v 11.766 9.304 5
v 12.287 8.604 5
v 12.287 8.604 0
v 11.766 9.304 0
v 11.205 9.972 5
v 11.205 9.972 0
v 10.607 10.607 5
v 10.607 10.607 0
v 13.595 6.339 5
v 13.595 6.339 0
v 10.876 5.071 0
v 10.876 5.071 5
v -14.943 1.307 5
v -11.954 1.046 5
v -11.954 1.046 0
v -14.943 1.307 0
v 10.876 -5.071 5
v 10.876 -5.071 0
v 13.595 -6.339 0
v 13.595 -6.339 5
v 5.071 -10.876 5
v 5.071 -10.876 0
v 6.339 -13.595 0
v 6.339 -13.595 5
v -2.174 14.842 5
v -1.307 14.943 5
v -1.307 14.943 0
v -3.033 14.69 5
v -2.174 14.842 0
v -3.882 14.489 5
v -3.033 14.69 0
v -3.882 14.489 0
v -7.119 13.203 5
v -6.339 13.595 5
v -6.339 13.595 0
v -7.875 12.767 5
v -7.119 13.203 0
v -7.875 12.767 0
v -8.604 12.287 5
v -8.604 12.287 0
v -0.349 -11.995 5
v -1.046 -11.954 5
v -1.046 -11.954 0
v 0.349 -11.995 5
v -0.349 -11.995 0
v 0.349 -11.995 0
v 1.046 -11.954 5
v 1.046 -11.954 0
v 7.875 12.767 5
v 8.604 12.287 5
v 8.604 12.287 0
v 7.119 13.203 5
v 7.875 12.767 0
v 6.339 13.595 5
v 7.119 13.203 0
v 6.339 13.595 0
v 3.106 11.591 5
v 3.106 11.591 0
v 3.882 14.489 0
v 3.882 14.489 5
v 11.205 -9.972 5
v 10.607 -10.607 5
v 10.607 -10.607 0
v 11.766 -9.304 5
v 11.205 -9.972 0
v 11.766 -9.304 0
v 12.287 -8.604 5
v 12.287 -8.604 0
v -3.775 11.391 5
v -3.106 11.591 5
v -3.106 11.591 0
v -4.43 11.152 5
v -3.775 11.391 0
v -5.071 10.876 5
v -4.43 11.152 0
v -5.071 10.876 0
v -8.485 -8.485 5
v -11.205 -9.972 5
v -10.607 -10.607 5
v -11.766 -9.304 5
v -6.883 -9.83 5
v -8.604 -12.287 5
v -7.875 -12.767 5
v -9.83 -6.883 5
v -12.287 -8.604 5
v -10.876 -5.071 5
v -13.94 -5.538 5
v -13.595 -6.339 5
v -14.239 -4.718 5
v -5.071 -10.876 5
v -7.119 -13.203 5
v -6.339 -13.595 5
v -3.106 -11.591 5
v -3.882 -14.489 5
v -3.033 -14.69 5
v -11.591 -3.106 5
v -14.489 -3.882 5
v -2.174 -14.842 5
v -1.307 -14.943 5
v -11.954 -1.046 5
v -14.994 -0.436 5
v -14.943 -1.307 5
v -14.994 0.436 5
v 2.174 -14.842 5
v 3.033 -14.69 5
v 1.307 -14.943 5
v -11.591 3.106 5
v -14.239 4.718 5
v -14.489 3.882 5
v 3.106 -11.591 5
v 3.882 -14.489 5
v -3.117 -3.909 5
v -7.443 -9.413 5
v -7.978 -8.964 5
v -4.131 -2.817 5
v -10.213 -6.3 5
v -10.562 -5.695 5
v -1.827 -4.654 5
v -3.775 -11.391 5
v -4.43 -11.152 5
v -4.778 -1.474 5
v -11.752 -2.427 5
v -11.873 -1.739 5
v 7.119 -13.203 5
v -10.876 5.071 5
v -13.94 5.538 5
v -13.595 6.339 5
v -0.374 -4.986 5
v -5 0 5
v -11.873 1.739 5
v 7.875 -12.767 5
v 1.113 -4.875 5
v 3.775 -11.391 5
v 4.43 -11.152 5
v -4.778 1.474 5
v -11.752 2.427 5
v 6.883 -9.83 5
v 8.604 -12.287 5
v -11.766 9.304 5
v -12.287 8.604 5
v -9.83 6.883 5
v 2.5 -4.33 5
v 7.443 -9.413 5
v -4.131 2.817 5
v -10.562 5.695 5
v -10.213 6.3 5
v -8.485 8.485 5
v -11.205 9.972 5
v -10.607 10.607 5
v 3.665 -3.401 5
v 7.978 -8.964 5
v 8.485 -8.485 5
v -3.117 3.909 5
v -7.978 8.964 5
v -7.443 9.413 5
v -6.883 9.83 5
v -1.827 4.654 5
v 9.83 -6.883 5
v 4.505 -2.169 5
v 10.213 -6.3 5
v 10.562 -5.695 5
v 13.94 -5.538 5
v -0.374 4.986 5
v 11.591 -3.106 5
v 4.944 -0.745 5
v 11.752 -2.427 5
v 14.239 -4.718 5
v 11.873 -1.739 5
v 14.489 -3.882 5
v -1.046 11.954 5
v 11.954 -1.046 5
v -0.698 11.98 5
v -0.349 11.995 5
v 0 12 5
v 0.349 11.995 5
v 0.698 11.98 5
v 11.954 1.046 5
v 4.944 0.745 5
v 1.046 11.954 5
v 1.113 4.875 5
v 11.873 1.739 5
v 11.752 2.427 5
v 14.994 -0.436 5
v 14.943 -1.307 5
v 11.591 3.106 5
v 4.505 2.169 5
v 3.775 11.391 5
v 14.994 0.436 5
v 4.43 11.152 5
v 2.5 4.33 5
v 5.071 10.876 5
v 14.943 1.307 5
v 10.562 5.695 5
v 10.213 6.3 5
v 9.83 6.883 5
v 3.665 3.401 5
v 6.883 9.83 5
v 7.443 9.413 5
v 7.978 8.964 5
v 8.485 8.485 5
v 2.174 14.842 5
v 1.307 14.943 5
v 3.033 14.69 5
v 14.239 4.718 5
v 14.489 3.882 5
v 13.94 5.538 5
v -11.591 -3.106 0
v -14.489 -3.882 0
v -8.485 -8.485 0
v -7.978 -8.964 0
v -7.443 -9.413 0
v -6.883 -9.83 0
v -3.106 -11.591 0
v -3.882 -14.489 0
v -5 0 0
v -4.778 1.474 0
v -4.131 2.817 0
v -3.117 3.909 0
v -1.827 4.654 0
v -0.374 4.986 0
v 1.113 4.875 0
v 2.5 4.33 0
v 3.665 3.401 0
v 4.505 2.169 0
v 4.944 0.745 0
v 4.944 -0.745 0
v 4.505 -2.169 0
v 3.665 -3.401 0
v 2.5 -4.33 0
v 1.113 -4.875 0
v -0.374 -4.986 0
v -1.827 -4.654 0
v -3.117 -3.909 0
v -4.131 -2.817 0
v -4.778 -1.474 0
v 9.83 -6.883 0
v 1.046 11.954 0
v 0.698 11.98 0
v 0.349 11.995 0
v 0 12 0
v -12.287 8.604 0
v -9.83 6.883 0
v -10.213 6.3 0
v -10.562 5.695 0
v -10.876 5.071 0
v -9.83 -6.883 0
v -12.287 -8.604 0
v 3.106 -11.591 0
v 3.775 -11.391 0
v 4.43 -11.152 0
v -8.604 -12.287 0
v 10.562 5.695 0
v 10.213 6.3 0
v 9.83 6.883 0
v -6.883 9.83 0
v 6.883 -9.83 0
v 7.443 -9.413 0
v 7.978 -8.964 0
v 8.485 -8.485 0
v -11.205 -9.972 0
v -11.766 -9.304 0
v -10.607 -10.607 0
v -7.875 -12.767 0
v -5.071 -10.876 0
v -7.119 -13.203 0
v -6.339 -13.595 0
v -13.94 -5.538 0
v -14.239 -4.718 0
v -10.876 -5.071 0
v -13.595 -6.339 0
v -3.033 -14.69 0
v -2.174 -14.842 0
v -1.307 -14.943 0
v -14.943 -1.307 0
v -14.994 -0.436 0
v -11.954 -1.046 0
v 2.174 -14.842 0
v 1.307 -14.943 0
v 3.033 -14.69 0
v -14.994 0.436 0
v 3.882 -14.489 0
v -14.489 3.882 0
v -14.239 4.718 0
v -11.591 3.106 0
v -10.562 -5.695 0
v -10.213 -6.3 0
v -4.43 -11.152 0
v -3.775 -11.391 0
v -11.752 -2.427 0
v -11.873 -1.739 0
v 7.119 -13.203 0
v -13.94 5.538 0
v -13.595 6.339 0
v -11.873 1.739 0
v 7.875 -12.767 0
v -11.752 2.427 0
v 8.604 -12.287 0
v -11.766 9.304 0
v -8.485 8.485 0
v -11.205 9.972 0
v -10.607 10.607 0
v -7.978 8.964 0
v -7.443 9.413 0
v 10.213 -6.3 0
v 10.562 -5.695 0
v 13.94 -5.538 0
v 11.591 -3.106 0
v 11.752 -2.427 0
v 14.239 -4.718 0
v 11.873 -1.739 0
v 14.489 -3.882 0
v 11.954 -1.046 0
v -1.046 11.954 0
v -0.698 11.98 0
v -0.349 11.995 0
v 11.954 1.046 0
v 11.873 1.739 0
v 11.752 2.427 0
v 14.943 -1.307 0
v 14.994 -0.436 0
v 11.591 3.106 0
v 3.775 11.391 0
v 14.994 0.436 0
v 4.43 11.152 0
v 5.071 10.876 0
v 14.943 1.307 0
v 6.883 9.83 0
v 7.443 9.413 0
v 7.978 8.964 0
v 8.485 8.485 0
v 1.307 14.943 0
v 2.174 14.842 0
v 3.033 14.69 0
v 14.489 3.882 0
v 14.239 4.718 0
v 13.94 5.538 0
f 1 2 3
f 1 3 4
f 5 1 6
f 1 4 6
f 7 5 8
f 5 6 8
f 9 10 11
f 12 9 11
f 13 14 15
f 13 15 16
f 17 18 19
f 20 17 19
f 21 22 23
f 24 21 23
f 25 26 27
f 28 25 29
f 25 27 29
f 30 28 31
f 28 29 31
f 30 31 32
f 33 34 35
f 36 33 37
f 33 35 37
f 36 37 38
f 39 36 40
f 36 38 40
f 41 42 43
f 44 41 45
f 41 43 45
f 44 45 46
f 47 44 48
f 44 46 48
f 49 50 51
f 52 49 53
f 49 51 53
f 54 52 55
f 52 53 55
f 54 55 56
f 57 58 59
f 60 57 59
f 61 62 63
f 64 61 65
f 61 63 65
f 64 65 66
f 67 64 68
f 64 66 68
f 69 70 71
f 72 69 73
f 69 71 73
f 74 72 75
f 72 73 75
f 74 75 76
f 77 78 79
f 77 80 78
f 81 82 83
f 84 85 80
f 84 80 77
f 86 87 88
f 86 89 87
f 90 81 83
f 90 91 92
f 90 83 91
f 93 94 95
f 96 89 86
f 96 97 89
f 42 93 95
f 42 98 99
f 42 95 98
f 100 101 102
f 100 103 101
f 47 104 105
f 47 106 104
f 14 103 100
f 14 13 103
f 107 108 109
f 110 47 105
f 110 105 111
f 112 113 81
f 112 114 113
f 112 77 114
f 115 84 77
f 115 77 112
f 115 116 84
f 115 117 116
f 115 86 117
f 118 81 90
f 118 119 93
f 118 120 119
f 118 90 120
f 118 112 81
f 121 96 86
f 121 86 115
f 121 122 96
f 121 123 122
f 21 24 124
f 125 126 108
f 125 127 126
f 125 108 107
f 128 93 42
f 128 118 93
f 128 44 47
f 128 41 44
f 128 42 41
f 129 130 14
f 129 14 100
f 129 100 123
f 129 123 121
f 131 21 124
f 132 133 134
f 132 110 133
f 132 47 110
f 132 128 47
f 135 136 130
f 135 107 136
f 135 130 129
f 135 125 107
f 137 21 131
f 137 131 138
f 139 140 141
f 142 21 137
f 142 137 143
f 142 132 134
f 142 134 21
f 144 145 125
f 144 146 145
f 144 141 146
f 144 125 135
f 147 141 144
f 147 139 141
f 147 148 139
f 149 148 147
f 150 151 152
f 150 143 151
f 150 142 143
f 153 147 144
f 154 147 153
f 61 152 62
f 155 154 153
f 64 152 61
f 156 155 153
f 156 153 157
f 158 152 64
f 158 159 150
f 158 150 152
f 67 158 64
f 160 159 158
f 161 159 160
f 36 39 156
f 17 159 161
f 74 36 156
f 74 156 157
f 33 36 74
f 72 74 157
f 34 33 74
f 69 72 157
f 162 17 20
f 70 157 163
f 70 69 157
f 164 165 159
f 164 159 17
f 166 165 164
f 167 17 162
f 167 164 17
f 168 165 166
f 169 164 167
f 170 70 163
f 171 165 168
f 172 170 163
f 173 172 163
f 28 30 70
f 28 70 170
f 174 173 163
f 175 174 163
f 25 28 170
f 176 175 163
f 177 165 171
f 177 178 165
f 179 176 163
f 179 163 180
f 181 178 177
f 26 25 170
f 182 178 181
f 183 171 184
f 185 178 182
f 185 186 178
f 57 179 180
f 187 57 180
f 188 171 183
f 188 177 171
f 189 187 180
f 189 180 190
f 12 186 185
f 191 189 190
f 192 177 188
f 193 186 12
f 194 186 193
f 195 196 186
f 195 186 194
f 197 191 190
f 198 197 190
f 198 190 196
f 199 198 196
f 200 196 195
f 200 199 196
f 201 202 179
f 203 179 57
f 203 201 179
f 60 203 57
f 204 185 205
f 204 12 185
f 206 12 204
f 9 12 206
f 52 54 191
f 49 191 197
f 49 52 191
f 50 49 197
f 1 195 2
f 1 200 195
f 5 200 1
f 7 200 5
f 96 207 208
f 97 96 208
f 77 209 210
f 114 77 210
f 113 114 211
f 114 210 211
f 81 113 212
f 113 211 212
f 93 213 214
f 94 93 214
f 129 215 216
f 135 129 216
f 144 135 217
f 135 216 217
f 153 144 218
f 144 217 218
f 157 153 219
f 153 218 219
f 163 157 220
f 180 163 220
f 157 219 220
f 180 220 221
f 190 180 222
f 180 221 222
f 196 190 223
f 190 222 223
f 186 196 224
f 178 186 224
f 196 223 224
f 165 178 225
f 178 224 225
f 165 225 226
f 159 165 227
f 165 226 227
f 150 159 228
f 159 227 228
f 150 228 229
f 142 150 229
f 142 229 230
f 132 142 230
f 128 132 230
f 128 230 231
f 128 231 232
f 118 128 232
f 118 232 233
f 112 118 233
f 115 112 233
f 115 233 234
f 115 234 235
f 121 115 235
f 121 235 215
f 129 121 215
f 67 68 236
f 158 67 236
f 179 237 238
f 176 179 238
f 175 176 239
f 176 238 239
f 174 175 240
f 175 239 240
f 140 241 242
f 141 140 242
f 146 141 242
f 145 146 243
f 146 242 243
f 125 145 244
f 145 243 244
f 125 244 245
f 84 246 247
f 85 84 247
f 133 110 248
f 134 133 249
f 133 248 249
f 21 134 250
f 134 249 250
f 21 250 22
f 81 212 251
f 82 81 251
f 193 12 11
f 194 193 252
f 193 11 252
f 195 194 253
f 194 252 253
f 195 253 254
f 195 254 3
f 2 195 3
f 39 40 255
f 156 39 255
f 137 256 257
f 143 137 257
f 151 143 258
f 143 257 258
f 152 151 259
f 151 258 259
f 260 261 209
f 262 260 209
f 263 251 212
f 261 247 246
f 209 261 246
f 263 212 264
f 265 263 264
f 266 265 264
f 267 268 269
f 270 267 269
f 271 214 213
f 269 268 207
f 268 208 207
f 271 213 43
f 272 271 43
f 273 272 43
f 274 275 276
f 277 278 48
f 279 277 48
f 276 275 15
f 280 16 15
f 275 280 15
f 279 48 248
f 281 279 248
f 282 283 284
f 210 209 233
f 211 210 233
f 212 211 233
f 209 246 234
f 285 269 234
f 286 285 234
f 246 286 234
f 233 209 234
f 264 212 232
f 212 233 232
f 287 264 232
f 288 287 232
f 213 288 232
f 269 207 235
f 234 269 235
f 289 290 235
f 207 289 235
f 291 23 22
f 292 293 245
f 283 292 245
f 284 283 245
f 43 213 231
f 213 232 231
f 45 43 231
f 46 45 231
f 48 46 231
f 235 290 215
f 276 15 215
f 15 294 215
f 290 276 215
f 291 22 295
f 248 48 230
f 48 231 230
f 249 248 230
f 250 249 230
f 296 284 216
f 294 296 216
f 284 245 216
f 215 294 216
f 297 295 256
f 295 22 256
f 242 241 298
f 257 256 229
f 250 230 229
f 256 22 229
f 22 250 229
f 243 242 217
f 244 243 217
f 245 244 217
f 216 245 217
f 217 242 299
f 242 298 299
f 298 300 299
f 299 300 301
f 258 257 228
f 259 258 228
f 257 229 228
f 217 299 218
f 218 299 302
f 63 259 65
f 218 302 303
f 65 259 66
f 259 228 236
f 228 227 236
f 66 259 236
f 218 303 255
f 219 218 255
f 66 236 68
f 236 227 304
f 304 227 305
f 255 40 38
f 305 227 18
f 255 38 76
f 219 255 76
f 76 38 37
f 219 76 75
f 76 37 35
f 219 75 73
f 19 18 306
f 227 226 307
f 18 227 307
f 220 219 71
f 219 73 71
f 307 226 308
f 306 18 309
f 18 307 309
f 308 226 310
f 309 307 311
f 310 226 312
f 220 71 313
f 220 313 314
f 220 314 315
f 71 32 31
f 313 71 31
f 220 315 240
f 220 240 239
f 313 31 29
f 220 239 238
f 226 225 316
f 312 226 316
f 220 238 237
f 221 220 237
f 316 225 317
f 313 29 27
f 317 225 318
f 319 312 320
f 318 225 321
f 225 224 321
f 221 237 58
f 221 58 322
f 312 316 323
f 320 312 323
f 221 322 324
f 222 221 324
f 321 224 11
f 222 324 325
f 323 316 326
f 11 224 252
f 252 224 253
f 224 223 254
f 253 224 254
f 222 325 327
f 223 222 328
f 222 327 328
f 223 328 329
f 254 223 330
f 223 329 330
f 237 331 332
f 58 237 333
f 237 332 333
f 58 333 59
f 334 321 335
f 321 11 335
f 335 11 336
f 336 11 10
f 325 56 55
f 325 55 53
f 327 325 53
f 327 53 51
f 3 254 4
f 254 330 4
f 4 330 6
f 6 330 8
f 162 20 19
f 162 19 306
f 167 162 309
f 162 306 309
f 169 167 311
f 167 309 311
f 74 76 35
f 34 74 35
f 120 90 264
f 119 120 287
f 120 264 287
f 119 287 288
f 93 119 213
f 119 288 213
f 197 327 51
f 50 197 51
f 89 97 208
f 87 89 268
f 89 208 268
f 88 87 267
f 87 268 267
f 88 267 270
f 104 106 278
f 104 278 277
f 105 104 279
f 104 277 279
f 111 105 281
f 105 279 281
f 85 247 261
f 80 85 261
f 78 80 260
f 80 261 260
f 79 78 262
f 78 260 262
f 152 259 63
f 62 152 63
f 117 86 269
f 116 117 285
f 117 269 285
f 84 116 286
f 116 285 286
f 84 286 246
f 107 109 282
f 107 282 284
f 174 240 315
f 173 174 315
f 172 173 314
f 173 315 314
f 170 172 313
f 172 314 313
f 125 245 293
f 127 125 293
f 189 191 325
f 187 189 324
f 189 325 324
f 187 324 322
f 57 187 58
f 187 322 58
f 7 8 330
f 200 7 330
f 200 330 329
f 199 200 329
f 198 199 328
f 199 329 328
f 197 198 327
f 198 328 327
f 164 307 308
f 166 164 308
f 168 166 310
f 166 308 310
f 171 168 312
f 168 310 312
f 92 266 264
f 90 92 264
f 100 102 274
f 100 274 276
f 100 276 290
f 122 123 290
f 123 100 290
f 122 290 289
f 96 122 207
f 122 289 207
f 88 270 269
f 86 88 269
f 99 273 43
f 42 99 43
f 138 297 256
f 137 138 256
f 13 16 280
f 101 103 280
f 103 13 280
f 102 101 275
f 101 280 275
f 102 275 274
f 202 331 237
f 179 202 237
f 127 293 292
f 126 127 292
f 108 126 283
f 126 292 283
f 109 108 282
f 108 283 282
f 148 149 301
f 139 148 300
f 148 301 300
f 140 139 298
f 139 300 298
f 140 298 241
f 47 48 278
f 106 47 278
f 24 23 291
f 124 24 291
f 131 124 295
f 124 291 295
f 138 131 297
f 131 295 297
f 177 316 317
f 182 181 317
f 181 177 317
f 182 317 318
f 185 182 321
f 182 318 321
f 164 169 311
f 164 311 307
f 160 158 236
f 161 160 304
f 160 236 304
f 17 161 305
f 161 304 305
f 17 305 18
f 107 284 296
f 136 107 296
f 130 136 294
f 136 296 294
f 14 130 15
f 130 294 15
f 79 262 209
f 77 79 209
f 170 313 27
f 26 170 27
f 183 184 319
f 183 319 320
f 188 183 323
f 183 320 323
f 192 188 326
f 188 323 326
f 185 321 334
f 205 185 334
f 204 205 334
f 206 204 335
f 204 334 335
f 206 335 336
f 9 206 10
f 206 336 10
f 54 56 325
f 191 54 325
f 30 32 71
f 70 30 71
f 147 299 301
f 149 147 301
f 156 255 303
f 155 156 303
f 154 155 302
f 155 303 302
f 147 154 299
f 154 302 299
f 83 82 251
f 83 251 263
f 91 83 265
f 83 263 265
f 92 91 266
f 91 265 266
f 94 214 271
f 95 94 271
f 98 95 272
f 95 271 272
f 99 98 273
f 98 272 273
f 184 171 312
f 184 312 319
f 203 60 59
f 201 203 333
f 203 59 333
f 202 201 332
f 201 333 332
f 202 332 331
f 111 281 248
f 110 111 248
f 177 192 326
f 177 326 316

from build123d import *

# Parameters (mm, degrees)
SKETCH_1_R          = 15
EXTRUDE_1_DEPTH     = 5
CUT_EXTRUDE_1_REACH = 23.794
CUT_EXTRUDE_2_REACH = 23.755
SKETCH_3_R          = 5


with BuildPart() as part:
    # ｽｹｯﾁ1 → ﾎﾞｽ - 押し出し1 (new body)
    with BuildSketch(Plane.XY):
        Circle(SKETCH_1_R)
    extrude(amount=EXTRUDE_1_DEPTH)

    # ｽｹｯﾁ2 → ｶｯﾄ - 押し出し1 (cut, up to next)
    with BuildSketch(Plane(origin=(0, 0, 0), x_dir=(-1, 0, 0), z_dir=(0, 0, -1)), mode=Mode.PRIVATE) as cut_extrude_1_sk1:
        with BuildLine():
            Line((-6.882917236, 9.829824531), (-8.603646545, 12.287280664))
            ThreePointArc((-8.603646545, 12.287280664), (-9.641814145, 11.490666647), (-10.606601718, 10.606601718))
            Line((-10.606601718, 10.606601718), (-8.485281374, 8.485281374))
            ThreePointArc((-8.485281374, 8.485281374), (-7.713451316, 9.192533317), (-6.882917236, 9.829824531))
        make_face()
    cut_extrude_1_tool1 = extrude(cut_extrude_1_sk1.sketch, amount=-CUT_EXTRUDE_1_REACH, mode=Mode.PRIVATE) & part.part
    # ｽｹｯﾁ2 → ｶｯﾄ - 押し出し1 (cut, up to next)
    with BuildSketch(Plane(origin=(0, 0, 0), x_dir=(-1, 0, 0), z_dir=(0, 0, -1)), mode=Mode.PRIVATE) as cut_extrude_1_sk2:
        with BuildLine():
            Line((-3.105828541, 11.591109915), (-3.882285677, 14.488887394))
            ThreePointArc((-3.882285677, 14.488887394), (-5.13030215, 14.095389312), (-6.339273926, 13.594616806))
            Line((-6.339273926, 13.594616806), (-5.071419141, 10.875693444))
            ThreePointArc((-5.071419141, 10.875693444), (-4.10424172, 11.276311449), (-3.105828541, 11.591109915))
        make_face()
    cut_extrude_1_tool2 = extrude(cut_extrude_1_sk2.sketch, amount=-CUT_EXTRUDE_1_REACH, mode=Mode.PRIVATE) & part.part
    # ｽｹｯﾁ2 → ｶｯﾄ - 押し出し1 (cut, up to next)
    with BuildSketch(Plane(origin=(0, 0, 0), x_dir=(-1, 0, 0), z_dir=(0, 0, -1)), mode=Mode.PRIVATE) as cut_extrude_1_sk3:
        with BuildLine():
            ThreePointArc((0, 12), (0.523432648, 11.988578659), (1.045868913, 11.954336377))
            Line((1.045868913, 11.954336377), (1.307336141, 14.942920471))
            ThreePointArc((1.307336141, 14.942920471), (0.65429081, 14.985723324), (0, 15))
            Line((0, 15), (0, 12))
        make_face()
    cut_extrude_1_tool3 = extrude(cut_extrude_1_sk3.sketch, amount=-CUT_EXTRUDE_1_REACH, mode=Mode.PRIVATE) & part.part
    # ｽｹｯﾁ2 → ｶｯﾄ - 押し出し1 (cut, up to next)
    with BuildSketch(Plane(origin=(0, 0, 0), x_dir=(-1, 0, 0), z_dir=(0, 0, -1)), mode=Mode.PRIVATE) as cut_extrude_1_sk4:
        with BuildLine():
            ThreePointArc((-1.045868913, 11.954336377), (-0.523432648, 11.988578659), (0, 12))
            Line((0, 12), (0, 15))
            ThreePointArc((0, 15), (-0.65429081, 14.985723324), (-1.307336141, 14.942920471))
            Line((-1.307336141, 14.942920471), (-1.045868913, 11.954336377))
        make_face()
    cut_extrude_1_tool4 = extrude(cut_extrude_1_sk4.sketch, amount=-CUT_EXTRUDE_1_REACH, mode=Mode.PRIVATE) & part.part
    # ｽｹｯﾁ2 → ｶｯﾄ - 押し出し1 (cut, up to next)
    with BuildSketch(Plane(origin=(0, 0, 0), x_dir=(-1, 0, 0), z_dir=(0, 0, -1)), mode=Mode.PRIVATE) as cut_extrude_1_sk5:
        with BuildLine():
            ThreePointArc((6.339273926, 13.594616806), (5.13030215, 14.095389312), (3.882285677, 14.488887394))
            Line((3.882285677, 14.488887394), (3.105828541, 11.591109915))
            ThreePointArc((3.105828541, 11.591109915), (4.10424172, 11.276311449), (5.071419141, 10.875693444))
            Line((5.071419141, 10.875693444), (6.339273926, 13.594616806))
        make_face()
    cut_extrude_1_tool5 = extrude(cut_extrude_1_sk5.sketch, amount=-CUT_EXTRUDE_1_REACH, mode=Mode.PRIVATE) & part.part
    # ｽｹｯﾁ2 → ｶｯﾄ - 押し出し1 (cut, up to next)
    with BuildSketch(Plane(origin=(0, 0, 0), x_dir=(-1, 0, 0), z_dir=(0, 0, -1)), mode=Mode.PRIVATE) as cut_extrude_1_sk6:
        with BuildLine():
            ThreePointArc((10.606601718, 10.606601718), (9.641814145, 11.490666647), (8.603646545, 12.287280664))
            Line((8.603646545, 12.287280664), (6.882917236, 9.829824531))
            ThreePointArc((6.882917236, 9.829824531), (7.713451316, 9.192533317), (8.485281374, 8.485281374))
            Line((8.485281374, 8.485281374), (10.606601718, 10.606601718))
        make_face()
    cut_extrude_1_tool6 = extrude(cut_extrude_1_sk6.sketch, amount=-CUT_EXTRUDE_1_REACH, mode=Mode.PRIVATE) & part.part
    # ｽｹｯﾁ2 → ｶｯﾄ - 押し出し1 (cut, up to next)
    with BuildSketch(Plane(origin=(0, 0, 0), x_dir=(-1, 0, 0), z_dir=(0, 0, -1)), mode=Mode.PRIVATE) as cut_extrude_1_sk7:
        with BuildLine():
            ThreePointArc((13.594616806, 6.339273926), (12.990381057, 7.5), (12.287280664, 8.603646545))
            Line((12.287280664, 8.603646545), (9.829824531, 6.882917236))
            ThreePointArc((9.829824531, 6.882917236), (10.392304845, 6), (10.875693444, 5.071419141))
            Line((10.875693444, 5.071419141), (13.594616806, 6.339273926))
        make_face()
    cut_extrude_1_tool7 = extrude(cut_extrude_1_sk7.sketch, amount=-CUT_EXTRUDE_1_REACH, mode=Mode.PRIVATE) & part.part
    # ｽｹｯﾁ2 → ｶｯﾄ - 押し出し1 (cut, up to next)
    with BuildSketch(Plane(origin=(0, 0, 0), x_dir=(-1, 0, 0), z_dir=(0, 0, -1)), mode=Mode.PRIVATE) as cut_extrude_1_sk8:
        with BuildLine():
            ThreePointArc((14.942920471, 1.307336141), (14.772116295, 2.604722665), (14.488887394, 3.882285677))
            Line((14.488887394, 3.882285677), (11.591109915, 3.105828541))
            ThreePointArc((11.591109915, 3.105828541), (11.817693036, 2.083778132), (11.954336377, 1.045868913))
            Line((11.954336377, 1.045868913), (14.942920471, 1.307336141))
        make_face()
    cut_extrude_1_tool8 = extrude(cut_extrude_1_sk8.sketch, amount=-CUT_EXTRUDE_1_REACH, mode=Mode.PRIVATE) & part.part
    # ｽｹｯﾁ2 → ｶｯﾄ - 押し出し1 (cut, up to next)
    with BuildSketch(Plane(origin=(0, 0, 0), x_dir=(-1, 0, 0), z_dir=(0, 0, -1)), mode=Mode.PRIVATE) as cut_extrude_1_sk9:
        with BuildLine():
            ThreePointArc((14.488887394, -3.882285677), (14.772116295, -2.604722665), (14.942920471, -1.307336141))
            Line((14.942920471, -1.307336141), (11.954336377, -1.045868913))
            ThreePointArc((11.954336377, -1.045868913), (11.817693036, -2.083778132), (11.591109915, -3.105828541))
            Line((11.591109915, -3.105828541), (14.488887394, -3.882285677))
        make_face()
    cut_extrude_1_tool9 = extrude(cut_extrude_1_sk9.sketch, amount=-CUT_EXTRUDE_1_REACH, mode=Mode.PRIVATE) & part.part
    # ｽｹｯﾁ2 → ｶｯﾄ - 押し出し1 (cut, up to next)
    with BuildSketch(Plane(origin=(0, 0, 0), x_dir=(-1, 0, 0), z_dir=(0, 0, -1)), mode=Mode.PRIVATE) as cut_extrude_1_sk10:
        with BuildLine():
            Line((-9.829824531, 6.882917236), (-12.287280664, 8.603646545))
            ThreePointArc((-12.287280664, 8.603646545), (-12.990381057, 7.5), (-13.594616806, 6.339273926))
            Line((-13.594616806, 6.339273926), (-10.875693444, 5.071419141))
            ThreePointArc((-10.875693444, 5.071419141), (-10.392304845, 6), (-9.829824531, 6.882917236))
        make_face()
    cut_extrude_1_tool10 = extrude(cut_extrude_1_sk10.sketch, amount=-CUT_EXTRUDE_1_REACH, mode=Mode.PRIVATE) & part.part
    # ｽｹｯﾁ2 → ｶｯﾄ - 押し出し1 (cut, up to next)
    with BuildSketch(Plane(origin=(0, 0, 0), x_dir=(-1, 0, 0), z_dir=(0, 0, -1)), mode=Mode.PRIVATE) as cut_extrude_1_sk11:
        with BuildLine():
            Line((-11.591109915, 3.105828541), (-14.488887394, 3.882285677))
            ThreePointArc((-14.488887394, 3.882285677), (-14.772116295, 2.604722665), (-14.942920471, 1.307336141))
            Line((-14.942920471, 1.307336141), (-11.954336377, 1.045868913))
            ThreePointArc((-11.954336377, 1.045868913), (-11.817693036, 2.083778132), (-11.591109915, 3.105828541))
        make_face()
    cut_extrude_1_tool11 = extrude(cut_extrude_1_sk11.sketch, amount=-CUT_EXTRUDE_1_REACH, mode=Mode.PRIVATE) & part.part
    # ｽｹｯﾁ2 → ｶｯﾄ - 押し出し1 (cut, up to next)
    with BuildSketch(Plane(origin=(0, 0, 0), x_dir=(-1, 0, 0), z_dir=(0, 0, -1)), mode=Mode.PRIVATE) as cut_extrude_1_sk12:
        with BuildLine():
            Line((-11.954336377, -1.045868913), (-14.942920471, -1.307336141))
            ThreePointArc((-14.942920471, -1.307336141), (-14.772116295, -2.604722665), (-14.488887394, -3.882285677))
            Line((-14.488887394, -3.882285677), (-11.591109915, -3.105828541))
            ThreePointArc((-11.591109915, -3.105828541), (-11.817693036, -2.083778132), (-11.954336377, -1.045868913))
        make_face()
    cut_extrude_1_tool12 = extrude(cut_extrude_1_sk12.sketch, amount=-CUT_EXTRUDE_1_REACH, mode=Mode.PRIVATE) & part.part
    # ｽｹｯﾁ2 → ｶｯﾄ - 押し出し1 (cut, up to next)
    with BuildSketch(Plane(origin=(0, 0, 0), x_dir=(-1, 0, 0), z_dir=(0, 0, -1)), mode=Mode.PRIVATE) as cut_extrude_1_sk13:
        with BuildLine():
            Line((-10.875693444, -5.071419141), (-13.594616806, -6.339273926))
            ThreePointArc((-13.594616806, -6.339273926), (-12.990381057, -7.5), (-12.287280664, -8.603646545))
            Line((-12.287280664, -8.603646545), (-9.829824531, -6.882917236))
            ThreePointArc((-9.829824531, -6.882917236), (-10.392304845, -6), (-10.875693444, -5.071419141))
        make_face()
    cut_extrude_1_tool13 = extrude(cut_extrude_1_sk13.sketch, amount=-CUT_EXTRUDE_1_REACH, mode=Mode.PRIVATE) & part.part
    # ｽｹｯﾁ2 → ｶｯﾄ - 押し出し1 (cut, up to next)
    with BuildSketch(Plane(origin=(0, 0, 0), x_dir=(-1, 0, 0), z_dir=(0, 0, -1)), mode=Mode.PRIVATE) as cut_extrude_1_sk14:
        with BuildLine():
            Line((-8.485281374, -8.485281374), (-10.606601718, -10.606601718))
            ThreePointArc((-10.606601718, -10.606601718), (-9.641814145, -11.490666647), (-8.603646545, -12.287280664))
            Line((-8.603646545, -12.287280664), (-6.882917236, -9.829824531))
            ThreePointArc((-6.882917236, -9.829824531), (-7.713451316, -9.192533317), (-8.485281374, -8.485281374))
        make_face()
    cut_extrude_1_tool14 = extrude(cut_extrude_1_sk14.sketch, amount=-CUT_EXTRUDE_1_REACH, mode=Mode.PRIVATE) & part.part
    # ｽｹｯﾁ2 → ｶｯﾄ - 押し出し1 (cut, up to next)
    with BuildSketch(Plane(origin=(0, 0, 0), x_dir=(-1, 0, 0), z_dir=(0, 0, -1)), mode=Mode.PRIVATE) as cut_extrude_1_sk15:
        with BuildLine():
            Line((-5.071419141, -10.875693444), (-6.339273926, -13.594616806))
            ThreePointArc((-6.339273926, -13.594616806), (-5.13030215, -14.095389312), (-3.882285677, -14.488887394))
            Line((-3.882285677, -14.488887394), (-3.105828541, -11.591109915))
            ThreePointArc((-3.105828541, -11.591109915), (-4.10424172, -11.276311449), (-5.071419141, -10.875693444))
        make_face()
    cut_extrude_1_tool15 = extrude(cut_extrude_1_sk15.sketch, amount=-CUT_EXTRUDE_1_REACH, mode=Mode.PRIVATE) & part.part
    # ｽｹｯﾁ2 → ｶｯﾄ - 押し出し1 (cut, up to next)
    with BuildSketch(Plane(origin=(0, 0, 0), x_dir=(-1, 0, 0), z_dir=(0, 0, -1)), mode=Mode.PRIVATE) as cut_extrude_1_sk16:
        with BuildLine():
            ThreePointArc((-1.307336141, -14.942920471), (0, -15), (1.307336141, -14.942920471))
            Line((1.307336141, -14.942920471), (1.045868913, -11.954336377))
            ThreePointArc((1.045868913, -11.954336377), (0, -12), (-1.045868913, -11.954336377))
            Line((-1.045868913, -11.954336377), (-1.307336141, -14.942920471))
        make_face()
    cut_extrude_1_tool16 = extrude(cut_extrude_1_sk16.sketch, amount=-CUT_EXTRUDE_1_REACH, mode=Mode.PRIVATE) & part.part
    # ｽｹｯﾁ2 → ｶｯﾄ - 押し出し1 (cut, up to next)
    with BuildSketch(Plane(origin=(0, 0, 0), x_dir=(-1, 0, 0), z_dir=(0, 0, -1)), mode=Mode.PRIVATE) as cut_extrude_1_sk17:
        with BuildLine():
            ThreePointArc((3.882285677, -14.488887394), (5.13030215, -14.095389312), (6.339273926, -13.594616806))
            Line((6.339273926, -13.594616806), (5.071419141, -10.875693444))
            ThreePointArc((5.071419141, -10.875693444), (4.10424172, -11.276311449), (3.105828541, -11.591109915))
            Line((3.105828541, -11.591109915), (3.882285677, -14.488887394))
        make_face()
    cut_extrude_1_tool17 = extrude(cut_extrude_1_sk17.sketch, amount=-CUT_EXTRUDE_1_REACH, mode=Mode.PRIVATE) & part.part
    # ｽｹｯﾁ2 → ｶｯﾄ - 押し出し1 (cut, up to next)
    with BuildSketch(Plane(origin=(0, 0, 0), x_dir=(-1, 0, 0), z_dir=(0, 0, -1)), mode=Mode.PRIVATE) as cut_extrude_1_sk18:
        with BuildLine():
            ThreePointArc((8.603646545, -12.287280664), (9.641814145, -11.490666647), (10.606601718, -10.606601718))
            Line((10.606601718, -10.606601718), (8.485281374, -8.485281374))
            ThreePointArc((8.485281374, -8.485281374), (7.713451316, -9.192533317), (6.882917236, -9.829824531))
            Line((6.882917236, -9.829824531), (8.603646545, -12.287280664))
        make_face()
    cut_extrude_1_tool18 = extrude(cut_extrude_1_sk18.sketch, amount=-CUT_EXTRUDE_1_REACH, mode=Mode.PRIVATE) & part.part
    # ｽｹｯﾁ2 → ｶｯﾄ - 押し出し1 (cut, up to next)
    with BuildSketch(Plane(origin=(0, 0, 0), x_dir=(-1, 0, 0), z_dir=(0, 0, -1)), mode=Mode.PRIVATE) as cut_extrude_1_sk19:
        with BuildLine():
            ThreePointArc((12.287280664, -8.603646545), (12.990381057, -7.5), (13.594616806, -6.339273926))
            Line((13.594616806, -6.339273926), (10.875693444, -5.071419141))
            ThreePointArc((10.875693444, -5.071419141), (10.392304845, -6), (9.829824531, -6.882917236))
            Line((9.829824531, -6.882917236), (12.287280664, -8.603646545))
        make_face()
    cut_extrude_1_tool19 = extrude(cut_extrude_1_sk19.sketch, amount=-CUT_EXTRUDE_1_REACH, mode=Mode.PRIVATE) & part.part
    add(cut_extrude_1_tool1.solids().sort_by_distance((8.702288, 10.370983, 0))[0], mode=Mode.SUBTRACT)
    add(cut_extrude_1_tool2.solids().sort_by_distance((4.630391, 12.721894, 0))[0], mode=Mode.SUBTRACT)
    add(cut_extrude_1_tool3.solids().sort_by_distance((-0.591097, 13.538357, 0))[0], mode=Mode.SUBTRACT)
    add(cut_extrude_1_tool4.solids().sort_by_distance((0.591097, 13.538357, 0))[0], mode=Mode.SUBTRACT)
    add(cut_extrude_1_tool5.solids().sort_by_distance((-4.630391, 12.721894, 0))[0], mode=Mode.SUBTRACT)
    add(cut_extrude_1_tool6.solids().sort_by_distance((-8.702288, 10.370983, 0))[0], mode=Mode.SUBTRACT)
    add(cut_extrude_1_tool7.solids().sort_by_distance((-11.724561, 6.769178, 0))[0], mode=Mode.SUBTRACT)
    add(cut_extrude_1_tool8.solids().sort_by_distance((-13.332679, 2.350911, 0))[0], mode=Mode.SUBTRACT)
    add(cut_extrude_1_tool9.solids().sort_by_distance((-13.332679, -2.350911, 0))[0], mode=Mode.SUBTRACT)
    add(cut_extrude_1_tool10.solids().sort_by_distance((11.724561, 6.769178, 0))[0], mode=Mode.SUBTRACT)
    add(cut_extrude_1_tool11.solids().sort_by_distance((13.332679, 2.350911, 0))[0], mode=Mode.SUBTRACT)
    add(cut_extrude_1_tool12.solids().sort_by_distance((13.332679, -2.350911, 0))[0], mode=Mode.SUBTRACT)
    add(cut_extrude_1_tool13.solids().sort_by_distance((11.724561, -6.769178, 0))[0], mode=Mode.SUBTRACT)
    add(cut_extrude_1_tool14.solids().sort_by_distance((8.702288, -10.370983, 0))[0], mode=Mode.SUBTRACT)
    add(cut_extrude_1_tool15.solids().sort_by_distance((4.630391, -12.721894, 0))[0], mode=Mode.SUBTRACT)
    add(cut_extrude_1_tool16.solids().sort_by_distance((0, -13.538357, 0))[0], mode=Mode.SUBTRACT)
    add(cut_extrude_1_tool17.solids().sort_by_distance((-4.630391, -12.721894, 0))[0], mode=Mode.SUBTRACT)
    add(cut_extrude_1_tool18.solids().sort_by_distance((-8.702288, -10.370983, 0))[0], mode=Mode.SUBTRACT)
    add(cut_extrude_1_tool19.solids().sort_by_distance((-11.724561, -6.769178, 0))[0], mode=Mode.SUBTRACT)

    # ｽｹｯﾁ3 → ｶｯﾄ - 押し出し2 (cut, up to next)
    with BuildSketch(Plane(origin=(0, 0, 0), x_dir=(-1, 0, 0), z_dir=(0, 0, -1)), mode=Mode.PRIVATE) as cut_extrude_2_sk1:
        Circle(SKETCH_3_R)
    cut_extrude_2_tool1 = extrude(cut_extrude_2_sk1.sketch, amount=-CUT_EXTRUDE_2_REACH, mode=Mode.PRIVATE) & part.part
    add(cut_extrude_2_tool1.solids().sort_by_distance((0, 0, 0))[0], mode=Mode.SUBTRACT)


solid = part.part
